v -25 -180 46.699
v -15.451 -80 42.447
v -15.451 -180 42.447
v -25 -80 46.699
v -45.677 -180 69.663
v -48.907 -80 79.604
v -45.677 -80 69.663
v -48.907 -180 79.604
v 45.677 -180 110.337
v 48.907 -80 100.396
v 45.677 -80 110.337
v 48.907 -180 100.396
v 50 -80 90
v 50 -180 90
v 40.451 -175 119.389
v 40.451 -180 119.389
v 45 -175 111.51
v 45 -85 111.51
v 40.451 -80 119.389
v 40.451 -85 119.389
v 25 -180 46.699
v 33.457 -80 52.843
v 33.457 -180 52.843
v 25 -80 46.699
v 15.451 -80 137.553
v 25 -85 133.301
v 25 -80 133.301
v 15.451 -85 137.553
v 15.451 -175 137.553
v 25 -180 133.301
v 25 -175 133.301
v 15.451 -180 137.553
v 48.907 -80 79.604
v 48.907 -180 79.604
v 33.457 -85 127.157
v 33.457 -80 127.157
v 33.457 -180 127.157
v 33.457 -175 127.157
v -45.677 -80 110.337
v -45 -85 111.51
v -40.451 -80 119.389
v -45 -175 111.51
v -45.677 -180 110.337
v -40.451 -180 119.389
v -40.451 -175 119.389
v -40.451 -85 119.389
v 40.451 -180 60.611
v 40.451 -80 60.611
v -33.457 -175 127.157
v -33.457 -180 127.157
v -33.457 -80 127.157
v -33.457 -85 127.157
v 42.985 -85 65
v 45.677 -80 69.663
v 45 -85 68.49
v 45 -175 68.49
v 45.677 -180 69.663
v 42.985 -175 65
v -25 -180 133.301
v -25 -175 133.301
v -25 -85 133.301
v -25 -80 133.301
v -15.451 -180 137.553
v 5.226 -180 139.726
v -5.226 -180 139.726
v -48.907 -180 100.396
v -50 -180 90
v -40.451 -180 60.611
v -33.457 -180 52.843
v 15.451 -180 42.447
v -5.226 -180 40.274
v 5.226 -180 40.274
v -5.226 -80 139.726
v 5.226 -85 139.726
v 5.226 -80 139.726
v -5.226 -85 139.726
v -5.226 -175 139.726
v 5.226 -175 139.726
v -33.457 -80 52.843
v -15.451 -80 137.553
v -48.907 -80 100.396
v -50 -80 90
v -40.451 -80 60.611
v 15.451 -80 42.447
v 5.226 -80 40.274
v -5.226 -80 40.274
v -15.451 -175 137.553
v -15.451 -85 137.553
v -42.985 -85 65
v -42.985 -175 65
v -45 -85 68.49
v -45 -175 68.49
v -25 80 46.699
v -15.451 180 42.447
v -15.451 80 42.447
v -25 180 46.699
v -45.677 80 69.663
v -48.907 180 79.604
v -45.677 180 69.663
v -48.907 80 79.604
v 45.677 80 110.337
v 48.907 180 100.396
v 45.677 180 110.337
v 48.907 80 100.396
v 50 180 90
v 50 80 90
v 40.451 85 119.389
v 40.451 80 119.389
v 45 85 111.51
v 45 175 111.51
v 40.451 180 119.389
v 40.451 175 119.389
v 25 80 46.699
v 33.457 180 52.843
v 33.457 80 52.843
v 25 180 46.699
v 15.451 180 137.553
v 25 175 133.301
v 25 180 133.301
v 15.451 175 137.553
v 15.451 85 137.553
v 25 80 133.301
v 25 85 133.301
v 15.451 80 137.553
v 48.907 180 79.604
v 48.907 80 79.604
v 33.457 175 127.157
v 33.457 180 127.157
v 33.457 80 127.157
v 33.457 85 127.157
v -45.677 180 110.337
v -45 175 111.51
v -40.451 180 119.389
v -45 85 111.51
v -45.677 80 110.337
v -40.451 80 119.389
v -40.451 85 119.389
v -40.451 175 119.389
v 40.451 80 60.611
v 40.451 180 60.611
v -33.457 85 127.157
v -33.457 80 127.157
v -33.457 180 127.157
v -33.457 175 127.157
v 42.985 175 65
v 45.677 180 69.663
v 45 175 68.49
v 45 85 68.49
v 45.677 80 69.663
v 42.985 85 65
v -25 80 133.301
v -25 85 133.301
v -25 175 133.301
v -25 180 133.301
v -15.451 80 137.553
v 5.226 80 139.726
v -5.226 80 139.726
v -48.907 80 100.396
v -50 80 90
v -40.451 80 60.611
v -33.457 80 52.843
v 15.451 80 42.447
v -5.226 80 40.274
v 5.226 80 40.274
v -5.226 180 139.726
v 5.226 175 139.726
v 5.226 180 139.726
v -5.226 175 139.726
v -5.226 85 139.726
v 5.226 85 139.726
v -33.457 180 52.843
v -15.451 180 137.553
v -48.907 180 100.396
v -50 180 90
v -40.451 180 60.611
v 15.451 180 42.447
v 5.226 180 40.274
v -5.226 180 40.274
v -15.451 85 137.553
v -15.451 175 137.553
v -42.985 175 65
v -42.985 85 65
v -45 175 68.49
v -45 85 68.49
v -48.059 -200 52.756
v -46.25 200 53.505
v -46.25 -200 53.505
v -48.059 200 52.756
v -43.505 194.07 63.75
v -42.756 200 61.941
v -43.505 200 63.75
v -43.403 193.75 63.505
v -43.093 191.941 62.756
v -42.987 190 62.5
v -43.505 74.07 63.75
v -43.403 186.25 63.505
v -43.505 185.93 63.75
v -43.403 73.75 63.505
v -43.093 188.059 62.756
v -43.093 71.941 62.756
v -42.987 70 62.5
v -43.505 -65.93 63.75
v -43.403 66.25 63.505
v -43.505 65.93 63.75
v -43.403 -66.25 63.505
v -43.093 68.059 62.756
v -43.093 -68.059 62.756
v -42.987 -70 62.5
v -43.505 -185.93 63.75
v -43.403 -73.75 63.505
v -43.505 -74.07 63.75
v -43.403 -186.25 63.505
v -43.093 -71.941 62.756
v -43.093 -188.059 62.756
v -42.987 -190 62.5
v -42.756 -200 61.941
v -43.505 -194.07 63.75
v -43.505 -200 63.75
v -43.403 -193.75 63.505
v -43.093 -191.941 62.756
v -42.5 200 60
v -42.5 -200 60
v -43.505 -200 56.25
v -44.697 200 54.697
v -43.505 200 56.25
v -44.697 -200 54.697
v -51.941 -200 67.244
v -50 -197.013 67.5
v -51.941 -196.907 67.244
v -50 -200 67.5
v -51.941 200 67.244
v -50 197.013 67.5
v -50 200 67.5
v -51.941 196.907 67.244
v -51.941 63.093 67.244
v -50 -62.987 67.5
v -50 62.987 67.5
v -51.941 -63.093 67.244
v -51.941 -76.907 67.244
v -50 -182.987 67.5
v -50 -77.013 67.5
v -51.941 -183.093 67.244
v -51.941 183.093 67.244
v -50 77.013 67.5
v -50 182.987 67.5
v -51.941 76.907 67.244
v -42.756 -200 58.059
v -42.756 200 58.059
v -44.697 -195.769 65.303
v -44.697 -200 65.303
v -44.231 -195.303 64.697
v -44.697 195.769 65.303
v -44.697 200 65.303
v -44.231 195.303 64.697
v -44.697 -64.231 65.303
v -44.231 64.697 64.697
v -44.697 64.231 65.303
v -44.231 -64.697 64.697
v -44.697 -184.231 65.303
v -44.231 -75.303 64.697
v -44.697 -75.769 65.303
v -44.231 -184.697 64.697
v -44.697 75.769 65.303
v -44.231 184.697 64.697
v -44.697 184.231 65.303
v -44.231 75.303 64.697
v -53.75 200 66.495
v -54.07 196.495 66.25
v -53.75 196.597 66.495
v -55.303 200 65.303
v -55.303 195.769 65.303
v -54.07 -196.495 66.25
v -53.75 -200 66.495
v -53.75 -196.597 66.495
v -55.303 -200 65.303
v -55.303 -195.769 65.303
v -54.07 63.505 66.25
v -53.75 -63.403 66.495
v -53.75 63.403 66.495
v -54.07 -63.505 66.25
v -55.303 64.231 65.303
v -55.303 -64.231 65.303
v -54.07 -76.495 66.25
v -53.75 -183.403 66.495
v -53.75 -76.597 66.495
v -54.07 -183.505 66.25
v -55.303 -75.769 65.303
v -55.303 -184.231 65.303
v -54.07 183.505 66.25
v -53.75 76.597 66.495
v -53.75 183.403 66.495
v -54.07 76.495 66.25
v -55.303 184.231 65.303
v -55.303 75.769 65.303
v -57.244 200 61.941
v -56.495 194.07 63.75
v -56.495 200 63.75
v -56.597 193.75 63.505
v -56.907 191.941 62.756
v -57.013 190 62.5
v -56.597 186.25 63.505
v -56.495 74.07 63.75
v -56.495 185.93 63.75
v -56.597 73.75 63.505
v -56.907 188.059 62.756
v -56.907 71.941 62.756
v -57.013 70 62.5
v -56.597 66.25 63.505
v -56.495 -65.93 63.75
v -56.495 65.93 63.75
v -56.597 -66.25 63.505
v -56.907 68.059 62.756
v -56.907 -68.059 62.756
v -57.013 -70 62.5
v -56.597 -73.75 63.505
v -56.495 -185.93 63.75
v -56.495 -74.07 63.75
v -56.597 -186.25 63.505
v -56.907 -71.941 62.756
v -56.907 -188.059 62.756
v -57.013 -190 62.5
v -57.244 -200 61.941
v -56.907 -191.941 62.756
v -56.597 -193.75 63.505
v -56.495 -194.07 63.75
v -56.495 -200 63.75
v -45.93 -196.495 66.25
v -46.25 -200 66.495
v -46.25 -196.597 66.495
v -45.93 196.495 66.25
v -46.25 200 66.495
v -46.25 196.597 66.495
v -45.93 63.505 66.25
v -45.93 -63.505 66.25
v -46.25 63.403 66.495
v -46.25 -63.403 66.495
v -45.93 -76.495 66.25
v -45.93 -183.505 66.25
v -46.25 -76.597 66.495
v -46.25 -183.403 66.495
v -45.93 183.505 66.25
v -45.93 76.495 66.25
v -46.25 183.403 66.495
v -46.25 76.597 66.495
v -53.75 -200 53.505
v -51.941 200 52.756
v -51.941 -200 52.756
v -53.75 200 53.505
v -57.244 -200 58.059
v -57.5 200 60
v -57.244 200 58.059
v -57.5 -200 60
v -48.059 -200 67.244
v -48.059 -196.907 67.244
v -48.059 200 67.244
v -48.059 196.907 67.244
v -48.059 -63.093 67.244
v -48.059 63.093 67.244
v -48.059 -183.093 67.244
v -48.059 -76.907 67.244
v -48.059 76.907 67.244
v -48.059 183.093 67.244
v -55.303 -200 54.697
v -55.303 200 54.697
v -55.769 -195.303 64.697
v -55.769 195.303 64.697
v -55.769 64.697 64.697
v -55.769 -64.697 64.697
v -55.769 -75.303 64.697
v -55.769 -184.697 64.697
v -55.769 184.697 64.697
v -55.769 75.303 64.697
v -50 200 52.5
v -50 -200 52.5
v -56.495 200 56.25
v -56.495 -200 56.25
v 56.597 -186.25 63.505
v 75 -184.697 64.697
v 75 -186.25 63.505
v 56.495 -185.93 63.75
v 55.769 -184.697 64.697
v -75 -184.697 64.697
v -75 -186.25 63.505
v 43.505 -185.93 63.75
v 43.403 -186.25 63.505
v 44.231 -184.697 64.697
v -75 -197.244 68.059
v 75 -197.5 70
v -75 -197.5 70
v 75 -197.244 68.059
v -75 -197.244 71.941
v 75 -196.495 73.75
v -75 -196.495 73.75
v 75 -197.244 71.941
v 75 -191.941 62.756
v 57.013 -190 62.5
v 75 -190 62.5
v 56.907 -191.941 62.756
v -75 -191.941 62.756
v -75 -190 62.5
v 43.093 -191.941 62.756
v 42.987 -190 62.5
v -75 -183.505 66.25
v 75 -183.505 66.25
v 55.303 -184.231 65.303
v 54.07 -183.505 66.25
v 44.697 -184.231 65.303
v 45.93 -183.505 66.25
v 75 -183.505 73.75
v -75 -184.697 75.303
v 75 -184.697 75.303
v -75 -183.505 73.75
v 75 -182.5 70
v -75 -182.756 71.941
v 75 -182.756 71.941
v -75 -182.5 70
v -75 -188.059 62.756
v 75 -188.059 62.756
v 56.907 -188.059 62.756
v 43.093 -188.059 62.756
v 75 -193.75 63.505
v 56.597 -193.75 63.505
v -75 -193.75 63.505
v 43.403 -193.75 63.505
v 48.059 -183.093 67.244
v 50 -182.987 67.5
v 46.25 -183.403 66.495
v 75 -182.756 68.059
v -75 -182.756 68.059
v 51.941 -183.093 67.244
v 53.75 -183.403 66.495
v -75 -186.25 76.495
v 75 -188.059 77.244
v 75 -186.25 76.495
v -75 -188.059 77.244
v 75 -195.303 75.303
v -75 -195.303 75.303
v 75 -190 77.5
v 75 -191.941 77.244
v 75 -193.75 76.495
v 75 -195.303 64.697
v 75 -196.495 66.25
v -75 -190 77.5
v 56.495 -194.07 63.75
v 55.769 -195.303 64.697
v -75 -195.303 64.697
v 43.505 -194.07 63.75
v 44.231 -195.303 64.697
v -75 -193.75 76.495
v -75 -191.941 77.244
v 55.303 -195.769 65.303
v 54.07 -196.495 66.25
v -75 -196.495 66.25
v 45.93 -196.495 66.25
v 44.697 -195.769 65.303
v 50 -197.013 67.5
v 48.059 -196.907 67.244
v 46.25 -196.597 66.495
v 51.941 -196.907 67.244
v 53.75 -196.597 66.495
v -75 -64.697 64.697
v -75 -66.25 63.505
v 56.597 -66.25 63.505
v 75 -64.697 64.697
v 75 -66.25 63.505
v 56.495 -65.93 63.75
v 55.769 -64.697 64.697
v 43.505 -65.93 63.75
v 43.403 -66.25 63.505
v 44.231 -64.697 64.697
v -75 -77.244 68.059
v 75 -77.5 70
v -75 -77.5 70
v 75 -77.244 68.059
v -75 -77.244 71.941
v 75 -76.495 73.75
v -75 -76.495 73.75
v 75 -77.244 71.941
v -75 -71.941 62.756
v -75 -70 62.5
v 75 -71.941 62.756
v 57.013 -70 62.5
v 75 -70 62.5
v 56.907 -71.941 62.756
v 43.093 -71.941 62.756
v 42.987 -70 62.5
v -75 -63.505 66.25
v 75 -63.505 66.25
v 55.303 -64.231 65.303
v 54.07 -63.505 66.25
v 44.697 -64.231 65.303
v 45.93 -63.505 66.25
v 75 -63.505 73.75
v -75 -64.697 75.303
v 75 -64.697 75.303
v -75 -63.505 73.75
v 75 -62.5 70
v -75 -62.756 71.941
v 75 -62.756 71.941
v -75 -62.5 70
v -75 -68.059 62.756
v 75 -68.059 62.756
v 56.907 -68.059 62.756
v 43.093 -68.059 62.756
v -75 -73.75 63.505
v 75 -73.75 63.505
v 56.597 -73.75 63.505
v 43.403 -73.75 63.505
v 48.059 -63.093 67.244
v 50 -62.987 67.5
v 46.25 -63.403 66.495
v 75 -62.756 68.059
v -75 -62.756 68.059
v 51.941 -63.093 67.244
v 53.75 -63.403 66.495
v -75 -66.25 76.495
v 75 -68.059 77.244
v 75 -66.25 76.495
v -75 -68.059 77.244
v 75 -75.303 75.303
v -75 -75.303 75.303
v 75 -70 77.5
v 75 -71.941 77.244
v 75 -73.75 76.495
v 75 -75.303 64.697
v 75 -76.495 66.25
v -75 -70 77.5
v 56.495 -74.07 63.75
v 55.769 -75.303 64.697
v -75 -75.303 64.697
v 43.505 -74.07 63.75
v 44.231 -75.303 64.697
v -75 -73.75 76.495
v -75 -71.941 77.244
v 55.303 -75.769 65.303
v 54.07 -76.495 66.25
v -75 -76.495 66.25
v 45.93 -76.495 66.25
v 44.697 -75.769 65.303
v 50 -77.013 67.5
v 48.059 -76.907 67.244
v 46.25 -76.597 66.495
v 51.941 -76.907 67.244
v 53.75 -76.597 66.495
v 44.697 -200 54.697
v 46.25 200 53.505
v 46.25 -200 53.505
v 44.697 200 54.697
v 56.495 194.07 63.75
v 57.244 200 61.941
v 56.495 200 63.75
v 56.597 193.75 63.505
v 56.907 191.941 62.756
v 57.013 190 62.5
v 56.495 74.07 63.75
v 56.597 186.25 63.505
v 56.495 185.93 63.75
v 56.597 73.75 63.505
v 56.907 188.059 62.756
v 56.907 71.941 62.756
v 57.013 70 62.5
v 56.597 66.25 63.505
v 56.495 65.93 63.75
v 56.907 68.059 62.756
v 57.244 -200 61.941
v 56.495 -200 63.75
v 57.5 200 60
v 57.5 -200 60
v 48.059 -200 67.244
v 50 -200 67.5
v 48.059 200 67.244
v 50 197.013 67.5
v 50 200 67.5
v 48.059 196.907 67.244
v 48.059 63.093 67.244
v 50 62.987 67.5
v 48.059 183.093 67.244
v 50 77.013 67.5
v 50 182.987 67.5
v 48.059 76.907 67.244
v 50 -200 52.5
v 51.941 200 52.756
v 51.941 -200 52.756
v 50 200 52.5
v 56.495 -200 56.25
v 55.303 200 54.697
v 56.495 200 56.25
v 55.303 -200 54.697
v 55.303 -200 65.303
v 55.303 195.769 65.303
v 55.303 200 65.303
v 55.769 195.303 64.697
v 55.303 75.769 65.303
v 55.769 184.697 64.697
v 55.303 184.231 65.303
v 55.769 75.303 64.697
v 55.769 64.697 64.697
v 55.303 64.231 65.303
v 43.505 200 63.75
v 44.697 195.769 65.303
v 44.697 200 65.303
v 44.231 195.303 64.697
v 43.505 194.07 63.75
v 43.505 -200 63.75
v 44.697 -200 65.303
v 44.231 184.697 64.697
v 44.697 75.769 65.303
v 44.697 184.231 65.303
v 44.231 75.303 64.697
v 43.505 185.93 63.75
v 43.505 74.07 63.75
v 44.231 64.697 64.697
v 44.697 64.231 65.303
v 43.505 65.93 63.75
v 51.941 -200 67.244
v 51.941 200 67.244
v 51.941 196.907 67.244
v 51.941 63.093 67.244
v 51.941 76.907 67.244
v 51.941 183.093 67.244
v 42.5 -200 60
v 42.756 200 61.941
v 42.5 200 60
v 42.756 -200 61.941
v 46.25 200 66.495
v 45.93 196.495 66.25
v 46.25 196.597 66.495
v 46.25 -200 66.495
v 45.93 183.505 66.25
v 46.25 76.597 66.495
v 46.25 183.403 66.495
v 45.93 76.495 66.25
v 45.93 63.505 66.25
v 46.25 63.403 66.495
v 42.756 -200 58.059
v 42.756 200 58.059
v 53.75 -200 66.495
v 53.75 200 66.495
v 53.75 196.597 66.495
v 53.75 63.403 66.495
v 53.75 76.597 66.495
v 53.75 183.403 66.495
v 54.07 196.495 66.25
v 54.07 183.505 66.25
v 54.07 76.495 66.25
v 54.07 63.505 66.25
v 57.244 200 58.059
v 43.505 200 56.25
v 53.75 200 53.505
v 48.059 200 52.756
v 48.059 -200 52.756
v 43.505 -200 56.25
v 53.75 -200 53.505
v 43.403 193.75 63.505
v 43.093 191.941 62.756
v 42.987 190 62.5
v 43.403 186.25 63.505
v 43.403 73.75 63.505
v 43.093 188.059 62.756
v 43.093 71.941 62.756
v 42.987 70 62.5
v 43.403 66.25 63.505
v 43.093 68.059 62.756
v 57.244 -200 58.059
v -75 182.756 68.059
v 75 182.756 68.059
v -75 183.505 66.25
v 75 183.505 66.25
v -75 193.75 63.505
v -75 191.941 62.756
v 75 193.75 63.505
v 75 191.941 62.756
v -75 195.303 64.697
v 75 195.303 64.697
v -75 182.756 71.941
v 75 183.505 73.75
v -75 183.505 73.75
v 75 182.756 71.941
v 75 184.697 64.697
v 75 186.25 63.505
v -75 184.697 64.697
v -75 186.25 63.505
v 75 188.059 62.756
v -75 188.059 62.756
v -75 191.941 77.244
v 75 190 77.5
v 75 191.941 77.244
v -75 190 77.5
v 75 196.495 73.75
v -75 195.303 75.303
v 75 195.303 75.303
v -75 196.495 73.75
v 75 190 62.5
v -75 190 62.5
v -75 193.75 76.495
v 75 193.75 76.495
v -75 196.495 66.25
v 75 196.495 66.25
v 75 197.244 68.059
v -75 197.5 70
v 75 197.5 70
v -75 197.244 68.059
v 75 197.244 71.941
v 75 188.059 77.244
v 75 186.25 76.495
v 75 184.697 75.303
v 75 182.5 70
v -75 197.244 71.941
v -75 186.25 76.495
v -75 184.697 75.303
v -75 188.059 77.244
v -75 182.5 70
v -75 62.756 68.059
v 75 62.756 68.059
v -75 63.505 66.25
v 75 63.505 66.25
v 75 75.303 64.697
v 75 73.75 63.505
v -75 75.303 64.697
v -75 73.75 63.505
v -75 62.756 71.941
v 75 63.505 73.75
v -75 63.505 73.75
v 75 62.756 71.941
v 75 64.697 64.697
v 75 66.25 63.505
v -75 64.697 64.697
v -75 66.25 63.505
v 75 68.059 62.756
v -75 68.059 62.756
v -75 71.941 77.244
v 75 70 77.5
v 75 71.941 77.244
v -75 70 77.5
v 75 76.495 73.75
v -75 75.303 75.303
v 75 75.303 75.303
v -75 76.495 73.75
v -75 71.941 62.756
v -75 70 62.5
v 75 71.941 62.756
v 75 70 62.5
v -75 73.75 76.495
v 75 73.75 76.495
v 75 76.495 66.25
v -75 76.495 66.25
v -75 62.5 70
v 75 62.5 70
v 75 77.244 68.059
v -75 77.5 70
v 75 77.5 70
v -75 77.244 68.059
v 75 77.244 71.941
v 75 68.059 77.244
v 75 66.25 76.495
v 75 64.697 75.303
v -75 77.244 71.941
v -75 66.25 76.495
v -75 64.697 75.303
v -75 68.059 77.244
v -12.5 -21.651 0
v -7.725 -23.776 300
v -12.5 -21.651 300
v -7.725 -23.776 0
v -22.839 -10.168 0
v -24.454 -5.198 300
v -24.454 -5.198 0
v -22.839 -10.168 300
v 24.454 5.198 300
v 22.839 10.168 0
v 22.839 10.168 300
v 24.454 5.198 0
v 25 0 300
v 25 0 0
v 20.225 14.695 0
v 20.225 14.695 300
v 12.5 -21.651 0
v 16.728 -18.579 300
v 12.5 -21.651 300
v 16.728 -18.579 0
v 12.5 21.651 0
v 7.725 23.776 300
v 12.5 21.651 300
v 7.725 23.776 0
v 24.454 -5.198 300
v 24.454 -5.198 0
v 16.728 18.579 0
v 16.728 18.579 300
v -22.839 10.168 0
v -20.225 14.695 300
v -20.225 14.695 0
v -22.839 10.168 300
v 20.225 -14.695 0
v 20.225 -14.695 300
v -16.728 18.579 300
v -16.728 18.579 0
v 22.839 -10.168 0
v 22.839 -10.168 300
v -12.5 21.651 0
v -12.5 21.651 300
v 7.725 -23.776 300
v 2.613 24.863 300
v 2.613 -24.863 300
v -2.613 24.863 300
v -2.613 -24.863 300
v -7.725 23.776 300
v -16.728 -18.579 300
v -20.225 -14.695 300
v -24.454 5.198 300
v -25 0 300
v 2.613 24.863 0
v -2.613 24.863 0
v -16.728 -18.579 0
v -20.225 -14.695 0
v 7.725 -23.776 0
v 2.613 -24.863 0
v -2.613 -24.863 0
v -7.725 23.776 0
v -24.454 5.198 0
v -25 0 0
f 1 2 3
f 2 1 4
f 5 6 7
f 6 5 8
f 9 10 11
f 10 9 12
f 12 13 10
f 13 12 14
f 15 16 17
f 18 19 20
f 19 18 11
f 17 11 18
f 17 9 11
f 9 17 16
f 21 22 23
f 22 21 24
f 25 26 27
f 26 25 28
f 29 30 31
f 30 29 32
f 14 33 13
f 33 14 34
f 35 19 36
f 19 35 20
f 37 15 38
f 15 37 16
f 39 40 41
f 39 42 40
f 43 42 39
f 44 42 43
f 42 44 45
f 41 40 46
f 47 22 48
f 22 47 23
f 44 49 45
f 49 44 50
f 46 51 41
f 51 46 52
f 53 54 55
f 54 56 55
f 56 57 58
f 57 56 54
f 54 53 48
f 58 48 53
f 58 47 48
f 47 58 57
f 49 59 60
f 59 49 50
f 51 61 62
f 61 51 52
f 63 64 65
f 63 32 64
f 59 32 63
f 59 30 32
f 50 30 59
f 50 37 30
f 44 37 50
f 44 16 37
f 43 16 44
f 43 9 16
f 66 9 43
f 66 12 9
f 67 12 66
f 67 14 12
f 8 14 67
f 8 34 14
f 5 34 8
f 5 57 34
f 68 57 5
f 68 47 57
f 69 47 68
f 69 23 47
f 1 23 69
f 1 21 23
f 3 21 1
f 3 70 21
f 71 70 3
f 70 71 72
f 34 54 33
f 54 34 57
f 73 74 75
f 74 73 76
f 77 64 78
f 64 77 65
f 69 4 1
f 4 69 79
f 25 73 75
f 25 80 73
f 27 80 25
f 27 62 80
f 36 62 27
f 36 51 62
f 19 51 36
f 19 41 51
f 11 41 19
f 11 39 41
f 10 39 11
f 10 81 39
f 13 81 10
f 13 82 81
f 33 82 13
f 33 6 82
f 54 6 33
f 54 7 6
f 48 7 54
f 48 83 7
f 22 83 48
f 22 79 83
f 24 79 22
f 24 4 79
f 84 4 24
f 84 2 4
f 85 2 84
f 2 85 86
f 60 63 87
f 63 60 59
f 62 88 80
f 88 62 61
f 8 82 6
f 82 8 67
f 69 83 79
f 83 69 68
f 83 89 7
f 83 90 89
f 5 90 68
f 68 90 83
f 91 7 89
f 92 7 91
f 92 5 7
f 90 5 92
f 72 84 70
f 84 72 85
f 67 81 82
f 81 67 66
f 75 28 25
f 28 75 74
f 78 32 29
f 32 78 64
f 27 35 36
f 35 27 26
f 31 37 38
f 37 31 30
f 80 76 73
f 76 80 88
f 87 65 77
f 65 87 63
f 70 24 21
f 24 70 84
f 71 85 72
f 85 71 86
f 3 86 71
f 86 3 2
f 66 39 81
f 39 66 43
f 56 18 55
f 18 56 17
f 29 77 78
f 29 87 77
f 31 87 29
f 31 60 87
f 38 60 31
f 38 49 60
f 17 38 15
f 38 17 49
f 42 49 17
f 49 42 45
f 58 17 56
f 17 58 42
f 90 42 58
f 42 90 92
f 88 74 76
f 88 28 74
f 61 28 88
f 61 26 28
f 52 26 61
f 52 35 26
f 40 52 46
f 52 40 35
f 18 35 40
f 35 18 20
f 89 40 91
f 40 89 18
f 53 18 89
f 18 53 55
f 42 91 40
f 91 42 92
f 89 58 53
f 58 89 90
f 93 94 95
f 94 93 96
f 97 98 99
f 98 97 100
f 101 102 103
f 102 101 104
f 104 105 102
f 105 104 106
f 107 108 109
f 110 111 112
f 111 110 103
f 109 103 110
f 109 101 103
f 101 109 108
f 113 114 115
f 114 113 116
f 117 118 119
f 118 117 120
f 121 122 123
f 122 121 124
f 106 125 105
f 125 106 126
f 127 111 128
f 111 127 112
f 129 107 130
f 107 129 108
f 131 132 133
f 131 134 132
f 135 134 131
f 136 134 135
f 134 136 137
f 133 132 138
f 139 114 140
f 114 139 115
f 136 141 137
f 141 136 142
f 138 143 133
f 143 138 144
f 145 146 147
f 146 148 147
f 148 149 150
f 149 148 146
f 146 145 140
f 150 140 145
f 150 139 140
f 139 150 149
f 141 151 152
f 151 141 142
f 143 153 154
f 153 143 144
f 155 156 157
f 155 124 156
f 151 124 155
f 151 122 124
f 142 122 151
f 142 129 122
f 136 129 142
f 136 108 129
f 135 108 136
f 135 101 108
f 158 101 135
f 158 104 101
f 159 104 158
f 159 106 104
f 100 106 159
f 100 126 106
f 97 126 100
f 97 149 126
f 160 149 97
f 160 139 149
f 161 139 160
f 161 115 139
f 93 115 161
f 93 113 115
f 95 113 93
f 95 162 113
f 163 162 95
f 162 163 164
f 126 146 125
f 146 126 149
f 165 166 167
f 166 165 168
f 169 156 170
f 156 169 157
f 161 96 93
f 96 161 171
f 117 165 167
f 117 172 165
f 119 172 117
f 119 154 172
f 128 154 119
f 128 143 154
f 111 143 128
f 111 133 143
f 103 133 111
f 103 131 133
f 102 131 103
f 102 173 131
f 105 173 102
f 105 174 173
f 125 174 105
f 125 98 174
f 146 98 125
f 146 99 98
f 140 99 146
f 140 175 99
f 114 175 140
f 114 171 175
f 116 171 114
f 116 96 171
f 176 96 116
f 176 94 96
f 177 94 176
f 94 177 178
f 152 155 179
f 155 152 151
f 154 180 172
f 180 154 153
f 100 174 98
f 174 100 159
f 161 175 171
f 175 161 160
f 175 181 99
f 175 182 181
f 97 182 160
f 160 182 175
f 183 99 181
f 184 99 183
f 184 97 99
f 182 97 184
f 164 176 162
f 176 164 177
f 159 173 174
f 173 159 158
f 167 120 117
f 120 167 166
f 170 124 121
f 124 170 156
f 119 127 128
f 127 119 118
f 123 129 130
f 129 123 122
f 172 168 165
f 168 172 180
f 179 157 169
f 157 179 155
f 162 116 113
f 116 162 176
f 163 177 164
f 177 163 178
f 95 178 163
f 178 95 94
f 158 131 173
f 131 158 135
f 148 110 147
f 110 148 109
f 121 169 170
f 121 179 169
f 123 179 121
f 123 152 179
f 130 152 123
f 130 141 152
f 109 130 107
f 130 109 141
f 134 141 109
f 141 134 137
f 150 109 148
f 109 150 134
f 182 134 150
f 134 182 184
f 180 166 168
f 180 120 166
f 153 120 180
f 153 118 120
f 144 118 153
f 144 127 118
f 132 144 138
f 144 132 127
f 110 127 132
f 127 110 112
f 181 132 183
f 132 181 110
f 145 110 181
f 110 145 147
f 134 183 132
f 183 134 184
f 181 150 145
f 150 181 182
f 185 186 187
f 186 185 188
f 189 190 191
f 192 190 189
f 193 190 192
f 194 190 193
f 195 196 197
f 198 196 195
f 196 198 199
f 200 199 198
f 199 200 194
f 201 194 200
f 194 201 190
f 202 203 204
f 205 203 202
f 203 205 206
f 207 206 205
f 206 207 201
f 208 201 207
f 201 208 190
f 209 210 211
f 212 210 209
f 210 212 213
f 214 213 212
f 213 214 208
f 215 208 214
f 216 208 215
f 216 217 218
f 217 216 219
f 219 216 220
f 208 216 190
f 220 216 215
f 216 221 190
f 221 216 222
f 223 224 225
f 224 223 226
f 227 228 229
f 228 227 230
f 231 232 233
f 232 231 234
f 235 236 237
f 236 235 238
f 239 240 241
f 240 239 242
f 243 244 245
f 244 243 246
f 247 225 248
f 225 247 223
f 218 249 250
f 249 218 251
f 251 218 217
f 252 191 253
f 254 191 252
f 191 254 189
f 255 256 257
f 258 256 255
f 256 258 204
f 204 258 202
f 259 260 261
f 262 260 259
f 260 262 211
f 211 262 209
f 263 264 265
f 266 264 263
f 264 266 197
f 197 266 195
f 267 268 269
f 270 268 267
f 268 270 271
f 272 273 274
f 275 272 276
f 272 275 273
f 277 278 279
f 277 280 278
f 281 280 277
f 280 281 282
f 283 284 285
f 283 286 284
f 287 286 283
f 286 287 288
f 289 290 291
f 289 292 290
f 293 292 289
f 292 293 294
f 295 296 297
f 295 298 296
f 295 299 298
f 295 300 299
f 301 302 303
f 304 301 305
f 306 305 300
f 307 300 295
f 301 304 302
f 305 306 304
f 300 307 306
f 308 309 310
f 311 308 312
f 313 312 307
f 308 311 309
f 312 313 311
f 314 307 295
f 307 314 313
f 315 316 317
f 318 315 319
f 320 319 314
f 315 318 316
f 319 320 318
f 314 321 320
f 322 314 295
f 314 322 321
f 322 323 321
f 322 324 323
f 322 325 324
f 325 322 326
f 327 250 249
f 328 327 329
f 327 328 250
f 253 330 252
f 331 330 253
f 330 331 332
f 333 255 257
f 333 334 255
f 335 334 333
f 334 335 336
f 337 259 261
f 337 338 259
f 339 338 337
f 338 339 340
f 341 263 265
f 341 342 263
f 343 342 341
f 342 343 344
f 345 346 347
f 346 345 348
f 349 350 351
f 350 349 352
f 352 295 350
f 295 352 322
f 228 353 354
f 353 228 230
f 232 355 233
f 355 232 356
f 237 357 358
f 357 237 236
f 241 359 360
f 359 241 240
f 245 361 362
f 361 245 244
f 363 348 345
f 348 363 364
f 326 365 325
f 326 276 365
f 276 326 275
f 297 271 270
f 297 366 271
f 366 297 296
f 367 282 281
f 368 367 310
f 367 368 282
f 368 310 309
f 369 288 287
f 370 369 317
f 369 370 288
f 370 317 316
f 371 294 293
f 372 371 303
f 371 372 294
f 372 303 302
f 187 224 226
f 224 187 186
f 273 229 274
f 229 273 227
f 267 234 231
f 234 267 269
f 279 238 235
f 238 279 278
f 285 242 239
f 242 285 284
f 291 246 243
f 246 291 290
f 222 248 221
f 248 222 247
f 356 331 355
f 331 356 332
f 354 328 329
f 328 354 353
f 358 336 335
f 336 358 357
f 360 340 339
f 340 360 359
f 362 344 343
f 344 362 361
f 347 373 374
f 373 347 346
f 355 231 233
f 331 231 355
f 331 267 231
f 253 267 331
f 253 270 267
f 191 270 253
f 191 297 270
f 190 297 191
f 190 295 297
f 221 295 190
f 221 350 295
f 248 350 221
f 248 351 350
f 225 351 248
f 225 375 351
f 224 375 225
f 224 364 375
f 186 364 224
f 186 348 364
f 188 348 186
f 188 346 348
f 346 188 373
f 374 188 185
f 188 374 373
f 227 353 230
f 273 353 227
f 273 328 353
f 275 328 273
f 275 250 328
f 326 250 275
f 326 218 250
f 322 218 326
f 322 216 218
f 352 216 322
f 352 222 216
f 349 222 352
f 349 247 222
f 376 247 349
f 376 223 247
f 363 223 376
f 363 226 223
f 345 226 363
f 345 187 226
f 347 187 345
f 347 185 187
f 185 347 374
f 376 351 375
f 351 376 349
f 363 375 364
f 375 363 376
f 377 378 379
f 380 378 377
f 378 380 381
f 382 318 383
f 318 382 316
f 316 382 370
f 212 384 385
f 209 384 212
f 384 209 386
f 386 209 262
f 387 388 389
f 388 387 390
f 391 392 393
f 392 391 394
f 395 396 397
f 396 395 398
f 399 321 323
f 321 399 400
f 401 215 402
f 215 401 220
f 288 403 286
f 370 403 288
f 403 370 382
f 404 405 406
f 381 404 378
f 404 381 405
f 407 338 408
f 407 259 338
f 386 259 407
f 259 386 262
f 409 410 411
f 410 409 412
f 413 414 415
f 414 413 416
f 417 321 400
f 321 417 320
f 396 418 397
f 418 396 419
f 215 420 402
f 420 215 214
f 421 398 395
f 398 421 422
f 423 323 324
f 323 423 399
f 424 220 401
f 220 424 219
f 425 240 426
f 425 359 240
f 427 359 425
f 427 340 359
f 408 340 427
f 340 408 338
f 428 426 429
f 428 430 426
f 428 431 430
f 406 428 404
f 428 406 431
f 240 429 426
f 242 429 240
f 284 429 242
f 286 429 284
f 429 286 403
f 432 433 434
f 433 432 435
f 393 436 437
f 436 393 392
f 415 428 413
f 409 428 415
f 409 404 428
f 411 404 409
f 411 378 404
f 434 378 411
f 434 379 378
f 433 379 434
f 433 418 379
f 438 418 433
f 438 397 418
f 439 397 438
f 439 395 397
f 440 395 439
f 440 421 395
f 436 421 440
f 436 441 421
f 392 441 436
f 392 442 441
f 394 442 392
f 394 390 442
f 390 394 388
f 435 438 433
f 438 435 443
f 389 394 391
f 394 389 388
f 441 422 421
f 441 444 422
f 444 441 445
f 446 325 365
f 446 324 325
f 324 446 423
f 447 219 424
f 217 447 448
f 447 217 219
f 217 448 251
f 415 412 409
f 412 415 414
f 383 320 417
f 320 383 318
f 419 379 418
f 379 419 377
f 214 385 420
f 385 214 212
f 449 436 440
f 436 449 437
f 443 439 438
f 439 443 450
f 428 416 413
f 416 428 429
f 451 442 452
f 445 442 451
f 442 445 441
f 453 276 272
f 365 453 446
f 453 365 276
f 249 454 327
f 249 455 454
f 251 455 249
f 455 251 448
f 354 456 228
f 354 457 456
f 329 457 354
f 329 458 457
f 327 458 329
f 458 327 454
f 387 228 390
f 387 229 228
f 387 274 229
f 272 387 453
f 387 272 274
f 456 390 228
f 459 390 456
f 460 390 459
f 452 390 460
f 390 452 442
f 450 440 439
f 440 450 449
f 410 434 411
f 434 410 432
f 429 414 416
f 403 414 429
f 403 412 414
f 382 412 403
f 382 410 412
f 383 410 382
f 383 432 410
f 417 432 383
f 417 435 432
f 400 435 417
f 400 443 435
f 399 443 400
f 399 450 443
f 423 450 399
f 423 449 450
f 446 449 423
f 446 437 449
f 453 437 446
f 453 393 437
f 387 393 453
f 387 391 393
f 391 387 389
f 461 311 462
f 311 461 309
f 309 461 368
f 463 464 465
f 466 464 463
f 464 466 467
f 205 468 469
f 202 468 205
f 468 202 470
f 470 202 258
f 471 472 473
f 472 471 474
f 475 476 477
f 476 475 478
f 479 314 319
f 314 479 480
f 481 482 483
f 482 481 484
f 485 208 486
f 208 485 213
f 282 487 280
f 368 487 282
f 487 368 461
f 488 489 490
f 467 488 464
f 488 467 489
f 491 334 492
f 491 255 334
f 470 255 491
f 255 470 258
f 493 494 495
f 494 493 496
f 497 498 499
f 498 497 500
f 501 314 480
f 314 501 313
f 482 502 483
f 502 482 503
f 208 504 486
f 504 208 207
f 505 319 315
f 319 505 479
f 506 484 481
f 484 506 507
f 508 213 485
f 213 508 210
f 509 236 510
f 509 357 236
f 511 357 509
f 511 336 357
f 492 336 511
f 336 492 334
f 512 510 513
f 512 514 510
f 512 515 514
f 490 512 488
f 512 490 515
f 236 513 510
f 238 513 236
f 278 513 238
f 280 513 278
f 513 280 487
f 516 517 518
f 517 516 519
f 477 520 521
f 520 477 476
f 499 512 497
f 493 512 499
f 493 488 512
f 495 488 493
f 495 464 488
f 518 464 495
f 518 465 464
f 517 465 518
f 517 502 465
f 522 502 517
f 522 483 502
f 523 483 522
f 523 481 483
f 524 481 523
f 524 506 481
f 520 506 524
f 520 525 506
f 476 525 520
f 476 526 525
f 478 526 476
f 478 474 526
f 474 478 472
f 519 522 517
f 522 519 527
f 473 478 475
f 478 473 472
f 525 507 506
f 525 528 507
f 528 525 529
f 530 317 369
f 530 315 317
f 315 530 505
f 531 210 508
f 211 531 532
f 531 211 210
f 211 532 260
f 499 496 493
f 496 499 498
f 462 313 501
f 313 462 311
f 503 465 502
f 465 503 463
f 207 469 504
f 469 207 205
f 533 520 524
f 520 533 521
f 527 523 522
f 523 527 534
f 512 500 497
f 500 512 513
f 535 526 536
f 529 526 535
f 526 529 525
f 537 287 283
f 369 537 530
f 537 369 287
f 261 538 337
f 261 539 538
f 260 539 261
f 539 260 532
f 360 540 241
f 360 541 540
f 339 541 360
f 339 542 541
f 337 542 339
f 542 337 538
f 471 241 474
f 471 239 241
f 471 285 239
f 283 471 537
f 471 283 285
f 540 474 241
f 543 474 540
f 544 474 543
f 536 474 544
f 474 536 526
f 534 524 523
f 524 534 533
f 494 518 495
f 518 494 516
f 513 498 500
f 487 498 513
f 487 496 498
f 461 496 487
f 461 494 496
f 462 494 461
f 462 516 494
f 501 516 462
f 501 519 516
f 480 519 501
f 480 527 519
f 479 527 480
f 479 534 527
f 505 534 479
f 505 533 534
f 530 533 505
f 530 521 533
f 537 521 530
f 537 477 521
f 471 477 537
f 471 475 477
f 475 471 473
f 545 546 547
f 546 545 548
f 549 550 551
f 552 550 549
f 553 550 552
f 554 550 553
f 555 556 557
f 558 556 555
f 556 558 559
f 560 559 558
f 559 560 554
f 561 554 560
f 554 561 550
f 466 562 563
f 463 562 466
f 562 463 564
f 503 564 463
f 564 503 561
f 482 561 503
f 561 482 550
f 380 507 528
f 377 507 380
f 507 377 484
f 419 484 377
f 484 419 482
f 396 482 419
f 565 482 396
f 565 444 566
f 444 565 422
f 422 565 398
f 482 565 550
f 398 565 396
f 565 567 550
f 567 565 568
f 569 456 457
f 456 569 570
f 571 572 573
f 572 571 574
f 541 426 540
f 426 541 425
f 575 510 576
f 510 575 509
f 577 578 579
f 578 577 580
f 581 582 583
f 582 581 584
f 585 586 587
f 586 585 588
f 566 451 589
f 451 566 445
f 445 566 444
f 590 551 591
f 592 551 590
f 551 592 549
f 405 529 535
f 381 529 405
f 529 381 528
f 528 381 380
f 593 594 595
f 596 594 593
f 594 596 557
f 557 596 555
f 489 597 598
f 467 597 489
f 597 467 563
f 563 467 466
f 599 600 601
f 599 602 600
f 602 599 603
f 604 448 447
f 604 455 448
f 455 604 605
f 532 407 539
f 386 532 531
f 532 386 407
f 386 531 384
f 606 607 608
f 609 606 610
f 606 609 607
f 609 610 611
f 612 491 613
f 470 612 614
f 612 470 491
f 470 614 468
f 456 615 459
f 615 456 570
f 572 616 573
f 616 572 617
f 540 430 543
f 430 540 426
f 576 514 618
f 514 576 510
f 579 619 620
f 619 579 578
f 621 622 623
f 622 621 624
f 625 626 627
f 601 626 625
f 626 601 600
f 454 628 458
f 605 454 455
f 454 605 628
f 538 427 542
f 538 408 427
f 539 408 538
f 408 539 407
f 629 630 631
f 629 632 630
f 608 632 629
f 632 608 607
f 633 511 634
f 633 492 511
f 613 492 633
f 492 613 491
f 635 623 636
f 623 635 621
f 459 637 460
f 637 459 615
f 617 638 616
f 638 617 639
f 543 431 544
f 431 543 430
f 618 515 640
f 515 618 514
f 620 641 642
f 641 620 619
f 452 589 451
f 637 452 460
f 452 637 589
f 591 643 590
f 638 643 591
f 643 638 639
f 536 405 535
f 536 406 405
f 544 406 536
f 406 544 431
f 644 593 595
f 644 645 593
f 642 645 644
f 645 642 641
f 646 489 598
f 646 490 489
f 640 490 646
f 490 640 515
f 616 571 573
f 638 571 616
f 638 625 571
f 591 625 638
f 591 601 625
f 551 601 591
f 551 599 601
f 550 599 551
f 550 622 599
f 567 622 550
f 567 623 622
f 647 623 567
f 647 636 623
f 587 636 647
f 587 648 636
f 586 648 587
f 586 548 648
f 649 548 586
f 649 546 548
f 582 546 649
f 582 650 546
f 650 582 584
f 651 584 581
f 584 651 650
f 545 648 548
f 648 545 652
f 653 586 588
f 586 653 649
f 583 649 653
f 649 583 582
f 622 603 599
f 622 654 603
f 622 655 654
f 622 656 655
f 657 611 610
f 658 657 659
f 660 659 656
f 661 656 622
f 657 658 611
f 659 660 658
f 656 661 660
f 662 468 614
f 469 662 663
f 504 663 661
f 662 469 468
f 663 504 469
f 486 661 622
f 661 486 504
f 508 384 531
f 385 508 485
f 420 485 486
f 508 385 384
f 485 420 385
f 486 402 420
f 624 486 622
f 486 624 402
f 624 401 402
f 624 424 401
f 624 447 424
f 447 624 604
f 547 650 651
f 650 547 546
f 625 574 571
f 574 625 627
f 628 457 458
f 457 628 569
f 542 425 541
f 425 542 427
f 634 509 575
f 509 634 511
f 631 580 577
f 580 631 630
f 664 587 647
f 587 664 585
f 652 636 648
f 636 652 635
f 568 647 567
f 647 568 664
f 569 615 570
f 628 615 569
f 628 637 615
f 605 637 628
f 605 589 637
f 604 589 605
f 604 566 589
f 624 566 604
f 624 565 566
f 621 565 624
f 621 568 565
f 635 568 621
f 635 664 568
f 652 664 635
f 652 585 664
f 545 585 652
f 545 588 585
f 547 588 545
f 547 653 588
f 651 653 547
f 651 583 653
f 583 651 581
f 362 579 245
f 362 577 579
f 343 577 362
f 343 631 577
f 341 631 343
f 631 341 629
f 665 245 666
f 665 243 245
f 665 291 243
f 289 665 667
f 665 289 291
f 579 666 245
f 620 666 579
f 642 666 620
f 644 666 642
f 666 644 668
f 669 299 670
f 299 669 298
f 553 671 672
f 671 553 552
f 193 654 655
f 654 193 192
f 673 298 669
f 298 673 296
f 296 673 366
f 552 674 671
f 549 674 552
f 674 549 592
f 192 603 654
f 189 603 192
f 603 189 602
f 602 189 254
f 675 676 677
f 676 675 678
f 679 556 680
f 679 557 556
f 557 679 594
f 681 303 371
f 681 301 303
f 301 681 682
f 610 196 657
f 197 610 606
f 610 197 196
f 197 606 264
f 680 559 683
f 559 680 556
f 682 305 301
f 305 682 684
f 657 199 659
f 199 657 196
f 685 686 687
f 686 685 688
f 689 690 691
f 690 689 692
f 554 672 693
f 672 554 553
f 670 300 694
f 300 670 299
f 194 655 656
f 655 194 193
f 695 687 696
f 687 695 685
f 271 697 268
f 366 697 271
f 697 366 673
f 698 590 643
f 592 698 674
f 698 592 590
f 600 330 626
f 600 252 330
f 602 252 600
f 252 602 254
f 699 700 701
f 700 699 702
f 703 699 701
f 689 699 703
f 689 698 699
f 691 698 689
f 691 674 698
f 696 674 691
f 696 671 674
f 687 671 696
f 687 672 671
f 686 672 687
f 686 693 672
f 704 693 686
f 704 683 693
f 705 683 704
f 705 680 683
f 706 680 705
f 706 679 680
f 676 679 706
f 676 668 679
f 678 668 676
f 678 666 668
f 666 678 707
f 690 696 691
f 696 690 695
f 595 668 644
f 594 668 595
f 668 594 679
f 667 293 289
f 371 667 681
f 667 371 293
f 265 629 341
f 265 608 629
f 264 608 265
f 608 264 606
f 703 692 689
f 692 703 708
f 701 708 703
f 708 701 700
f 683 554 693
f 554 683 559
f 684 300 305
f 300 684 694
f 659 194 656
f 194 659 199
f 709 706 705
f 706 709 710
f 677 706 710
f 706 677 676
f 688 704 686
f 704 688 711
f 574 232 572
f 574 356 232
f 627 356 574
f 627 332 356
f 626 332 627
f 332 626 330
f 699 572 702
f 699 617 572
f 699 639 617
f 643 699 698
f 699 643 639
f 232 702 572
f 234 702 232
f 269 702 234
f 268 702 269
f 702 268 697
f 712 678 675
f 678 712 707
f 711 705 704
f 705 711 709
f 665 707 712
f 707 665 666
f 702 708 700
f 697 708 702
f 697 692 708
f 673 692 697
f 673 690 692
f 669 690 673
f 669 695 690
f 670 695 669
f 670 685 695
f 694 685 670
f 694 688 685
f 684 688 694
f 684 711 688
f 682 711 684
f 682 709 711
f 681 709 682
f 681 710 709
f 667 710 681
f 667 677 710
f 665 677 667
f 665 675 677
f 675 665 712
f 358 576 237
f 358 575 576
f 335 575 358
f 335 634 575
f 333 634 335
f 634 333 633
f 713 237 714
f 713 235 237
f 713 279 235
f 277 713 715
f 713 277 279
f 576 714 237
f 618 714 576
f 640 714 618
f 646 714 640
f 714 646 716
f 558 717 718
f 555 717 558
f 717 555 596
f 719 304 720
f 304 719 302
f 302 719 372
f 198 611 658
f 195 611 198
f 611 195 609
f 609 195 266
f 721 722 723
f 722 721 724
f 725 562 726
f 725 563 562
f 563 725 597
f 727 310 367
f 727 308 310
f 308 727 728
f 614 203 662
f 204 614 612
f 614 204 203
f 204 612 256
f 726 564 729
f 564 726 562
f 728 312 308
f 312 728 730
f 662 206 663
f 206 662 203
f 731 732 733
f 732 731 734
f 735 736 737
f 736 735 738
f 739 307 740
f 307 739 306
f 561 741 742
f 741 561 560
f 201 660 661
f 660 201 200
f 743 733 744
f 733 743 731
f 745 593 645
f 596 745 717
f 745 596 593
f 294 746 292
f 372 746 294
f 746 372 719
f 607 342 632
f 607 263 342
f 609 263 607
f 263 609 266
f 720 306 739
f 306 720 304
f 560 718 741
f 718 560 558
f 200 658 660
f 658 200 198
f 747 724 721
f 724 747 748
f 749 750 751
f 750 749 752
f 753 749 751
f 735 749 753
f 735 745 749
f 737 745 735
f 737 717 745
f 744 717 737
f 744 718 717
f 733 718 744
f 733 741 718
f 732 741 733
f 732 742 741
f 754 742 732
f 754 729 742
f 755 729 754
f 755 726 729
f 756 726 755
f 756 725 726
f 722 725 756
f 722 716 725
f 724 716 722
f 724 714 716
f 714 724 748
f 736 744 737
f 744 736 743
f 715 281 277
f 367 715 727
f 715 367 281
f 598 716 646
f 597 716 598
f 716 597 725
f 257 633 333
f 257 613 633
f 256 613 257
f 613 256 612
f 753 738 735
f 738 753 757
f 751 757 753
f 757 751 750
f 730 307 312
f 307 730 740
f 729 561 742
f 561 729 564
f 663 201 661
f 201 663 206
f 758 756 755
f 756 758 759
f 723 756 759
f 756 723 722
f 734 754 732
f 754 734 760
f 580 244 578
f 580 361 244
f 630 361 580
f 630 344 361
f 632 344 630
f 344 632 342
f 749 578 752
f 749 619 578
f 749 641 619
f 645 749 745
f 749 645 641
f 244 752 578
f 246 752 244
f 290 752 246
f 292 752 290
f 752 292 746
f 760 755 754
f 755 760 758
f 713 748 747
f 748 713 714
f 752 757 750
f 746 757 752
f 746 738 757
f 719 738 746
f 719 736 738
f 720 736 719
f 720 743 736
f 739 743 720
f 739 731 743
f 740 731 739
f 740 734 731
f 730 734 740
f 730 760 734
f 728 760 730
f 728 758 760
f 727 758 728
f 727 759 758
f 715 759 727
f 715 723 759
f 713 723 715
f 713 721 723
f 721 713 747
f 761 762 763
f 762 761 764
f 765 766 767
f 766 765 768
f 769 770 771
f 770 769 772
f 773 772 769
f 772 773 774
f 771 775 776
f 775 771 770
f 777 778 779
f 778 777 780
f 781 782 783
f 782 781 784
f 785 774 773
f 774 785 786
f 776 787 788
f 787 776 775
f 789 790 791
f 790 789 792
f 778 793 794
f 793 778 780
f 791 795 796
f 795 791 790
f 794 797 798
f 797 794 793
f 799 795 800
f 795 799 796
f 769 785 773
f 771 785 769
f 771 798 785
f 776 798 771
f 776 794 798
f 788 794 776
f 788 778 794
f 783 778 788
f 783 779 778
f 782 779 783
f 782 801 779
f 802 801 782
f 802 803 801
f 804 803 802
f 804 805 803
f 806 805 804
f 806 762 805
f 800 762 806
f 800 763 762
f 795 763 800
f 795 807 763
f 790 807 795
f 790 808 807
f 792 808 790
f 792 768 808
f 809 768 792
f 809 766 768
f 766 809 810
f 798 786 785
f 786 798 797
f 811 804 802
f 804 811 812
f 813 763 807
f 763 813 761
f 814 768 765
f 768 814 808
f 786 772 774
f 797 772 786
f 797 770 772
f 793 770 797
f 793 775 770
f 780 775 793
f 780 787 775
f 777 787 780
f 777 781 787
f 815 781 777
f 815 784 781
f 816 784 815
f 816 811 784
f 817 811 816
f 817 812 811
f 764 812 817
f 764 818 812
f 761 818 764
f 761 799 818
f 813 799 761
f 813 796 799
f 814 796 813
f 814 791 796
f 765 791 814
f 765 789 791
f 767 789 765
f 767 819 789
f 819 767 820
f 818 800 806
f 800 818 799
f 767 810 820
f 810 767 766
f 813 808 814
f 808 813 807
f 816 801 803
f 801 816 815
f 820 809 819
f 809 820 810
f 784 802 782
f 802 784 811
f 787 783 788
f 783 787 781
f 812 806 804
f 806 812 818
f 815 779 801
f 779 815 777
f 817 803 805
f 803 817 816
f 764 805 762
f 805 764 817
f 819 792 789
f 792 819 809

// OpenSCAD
// file: fanta.scad
// Johan Govers 2015
// OpenSCAD version 2014.03 


pd = 15; // paal diameter

module paal(l, center) {
  cylinder(h = l, r=pd / 2, center=center);
  echo("paal", l, "cm");
}


module ton() {
  color("blue")
  cylinder(h = 100, r=50, center=true);
  echo("ton 200l");  
}

module poot(p, length, hoek) {
  for (i = [0:360/p:360-(360/p)]) { 
    translate([0,0, sin(90-hoek) * (length - 50)]) 
    rotate([0, 180-hoek, i]) 
    translate([-pd/2,-pd/2,-50]) 
    paal(length, false);
  }
}

module driepoot(length, hoek) {
  poot(3, length, hoek);
}

module vierpoot(length, hoek) {
  poot(4, length, hoek);
}

// l=length, b=breet, m=maasgroote
module net(l, b, m) {
  for (i = [-b/2:m:b/2])
  translate([0,i, 0]) 
  rotate([0,90,0]) 
  cylinder(l, r=1, center=true);

  for (i = [-l/2:m:l/2])
  translate([i,0, 0]) 
  rotate([90,0,0]) 
  cylinder(b, r=1, center=true);
  echo ("net ", l, "x", b, " cm");
}

module autoband(inch_buiten = 28, inch_binnen = 20, h = 20) {
  color([0.5,0.5,0.5])
  rotate(a=90, v=[1,0,0]) 
  difference() {
    intersection() {
      sphere(r=inch_buiten*2.56/2, center=true);
      cylinder(h = h, r=inch_buiten*2.56/2,  center=true);
    }
    cylinder(h = 500, r=inch_binnen*2.56/2,  center=true);
  }
  echo("autoband");
}







// kussengevecht();
// ladder();
// autobandMuur();
// poort(500, 600);
// valnet();
// net(500,300,15);
// klimDrieHoek(500, 30);
// aframe();
// schoef();
// glijbaan();
// main file
include <fanta.scad>

module schoef(){
  // paal dik / oude boom
  cylinder(h = 300, r=25, center=false);
  
  for(i=[-1,1]) {
    translate([i*50, 200, 60])
    rotate(a=90, v=[1,0,0]) 
    paal(400, false);

    translate([0, i*190, 70])
    rotate(a=90, v=[0,1,0]) 
    paal(150, true);

    translate([0, i*70, 70])
    rotate(a=90, v=[0,1,0]) 
    paal(150, true);
    
    // ton
    translate([0, i*130, 90])
    rotate(a=90, v=[1,0,0])
      difference(){
        ton();
        translate([0, 20, 0])
        cube(90, true);
      }
  }
}

schoef();
